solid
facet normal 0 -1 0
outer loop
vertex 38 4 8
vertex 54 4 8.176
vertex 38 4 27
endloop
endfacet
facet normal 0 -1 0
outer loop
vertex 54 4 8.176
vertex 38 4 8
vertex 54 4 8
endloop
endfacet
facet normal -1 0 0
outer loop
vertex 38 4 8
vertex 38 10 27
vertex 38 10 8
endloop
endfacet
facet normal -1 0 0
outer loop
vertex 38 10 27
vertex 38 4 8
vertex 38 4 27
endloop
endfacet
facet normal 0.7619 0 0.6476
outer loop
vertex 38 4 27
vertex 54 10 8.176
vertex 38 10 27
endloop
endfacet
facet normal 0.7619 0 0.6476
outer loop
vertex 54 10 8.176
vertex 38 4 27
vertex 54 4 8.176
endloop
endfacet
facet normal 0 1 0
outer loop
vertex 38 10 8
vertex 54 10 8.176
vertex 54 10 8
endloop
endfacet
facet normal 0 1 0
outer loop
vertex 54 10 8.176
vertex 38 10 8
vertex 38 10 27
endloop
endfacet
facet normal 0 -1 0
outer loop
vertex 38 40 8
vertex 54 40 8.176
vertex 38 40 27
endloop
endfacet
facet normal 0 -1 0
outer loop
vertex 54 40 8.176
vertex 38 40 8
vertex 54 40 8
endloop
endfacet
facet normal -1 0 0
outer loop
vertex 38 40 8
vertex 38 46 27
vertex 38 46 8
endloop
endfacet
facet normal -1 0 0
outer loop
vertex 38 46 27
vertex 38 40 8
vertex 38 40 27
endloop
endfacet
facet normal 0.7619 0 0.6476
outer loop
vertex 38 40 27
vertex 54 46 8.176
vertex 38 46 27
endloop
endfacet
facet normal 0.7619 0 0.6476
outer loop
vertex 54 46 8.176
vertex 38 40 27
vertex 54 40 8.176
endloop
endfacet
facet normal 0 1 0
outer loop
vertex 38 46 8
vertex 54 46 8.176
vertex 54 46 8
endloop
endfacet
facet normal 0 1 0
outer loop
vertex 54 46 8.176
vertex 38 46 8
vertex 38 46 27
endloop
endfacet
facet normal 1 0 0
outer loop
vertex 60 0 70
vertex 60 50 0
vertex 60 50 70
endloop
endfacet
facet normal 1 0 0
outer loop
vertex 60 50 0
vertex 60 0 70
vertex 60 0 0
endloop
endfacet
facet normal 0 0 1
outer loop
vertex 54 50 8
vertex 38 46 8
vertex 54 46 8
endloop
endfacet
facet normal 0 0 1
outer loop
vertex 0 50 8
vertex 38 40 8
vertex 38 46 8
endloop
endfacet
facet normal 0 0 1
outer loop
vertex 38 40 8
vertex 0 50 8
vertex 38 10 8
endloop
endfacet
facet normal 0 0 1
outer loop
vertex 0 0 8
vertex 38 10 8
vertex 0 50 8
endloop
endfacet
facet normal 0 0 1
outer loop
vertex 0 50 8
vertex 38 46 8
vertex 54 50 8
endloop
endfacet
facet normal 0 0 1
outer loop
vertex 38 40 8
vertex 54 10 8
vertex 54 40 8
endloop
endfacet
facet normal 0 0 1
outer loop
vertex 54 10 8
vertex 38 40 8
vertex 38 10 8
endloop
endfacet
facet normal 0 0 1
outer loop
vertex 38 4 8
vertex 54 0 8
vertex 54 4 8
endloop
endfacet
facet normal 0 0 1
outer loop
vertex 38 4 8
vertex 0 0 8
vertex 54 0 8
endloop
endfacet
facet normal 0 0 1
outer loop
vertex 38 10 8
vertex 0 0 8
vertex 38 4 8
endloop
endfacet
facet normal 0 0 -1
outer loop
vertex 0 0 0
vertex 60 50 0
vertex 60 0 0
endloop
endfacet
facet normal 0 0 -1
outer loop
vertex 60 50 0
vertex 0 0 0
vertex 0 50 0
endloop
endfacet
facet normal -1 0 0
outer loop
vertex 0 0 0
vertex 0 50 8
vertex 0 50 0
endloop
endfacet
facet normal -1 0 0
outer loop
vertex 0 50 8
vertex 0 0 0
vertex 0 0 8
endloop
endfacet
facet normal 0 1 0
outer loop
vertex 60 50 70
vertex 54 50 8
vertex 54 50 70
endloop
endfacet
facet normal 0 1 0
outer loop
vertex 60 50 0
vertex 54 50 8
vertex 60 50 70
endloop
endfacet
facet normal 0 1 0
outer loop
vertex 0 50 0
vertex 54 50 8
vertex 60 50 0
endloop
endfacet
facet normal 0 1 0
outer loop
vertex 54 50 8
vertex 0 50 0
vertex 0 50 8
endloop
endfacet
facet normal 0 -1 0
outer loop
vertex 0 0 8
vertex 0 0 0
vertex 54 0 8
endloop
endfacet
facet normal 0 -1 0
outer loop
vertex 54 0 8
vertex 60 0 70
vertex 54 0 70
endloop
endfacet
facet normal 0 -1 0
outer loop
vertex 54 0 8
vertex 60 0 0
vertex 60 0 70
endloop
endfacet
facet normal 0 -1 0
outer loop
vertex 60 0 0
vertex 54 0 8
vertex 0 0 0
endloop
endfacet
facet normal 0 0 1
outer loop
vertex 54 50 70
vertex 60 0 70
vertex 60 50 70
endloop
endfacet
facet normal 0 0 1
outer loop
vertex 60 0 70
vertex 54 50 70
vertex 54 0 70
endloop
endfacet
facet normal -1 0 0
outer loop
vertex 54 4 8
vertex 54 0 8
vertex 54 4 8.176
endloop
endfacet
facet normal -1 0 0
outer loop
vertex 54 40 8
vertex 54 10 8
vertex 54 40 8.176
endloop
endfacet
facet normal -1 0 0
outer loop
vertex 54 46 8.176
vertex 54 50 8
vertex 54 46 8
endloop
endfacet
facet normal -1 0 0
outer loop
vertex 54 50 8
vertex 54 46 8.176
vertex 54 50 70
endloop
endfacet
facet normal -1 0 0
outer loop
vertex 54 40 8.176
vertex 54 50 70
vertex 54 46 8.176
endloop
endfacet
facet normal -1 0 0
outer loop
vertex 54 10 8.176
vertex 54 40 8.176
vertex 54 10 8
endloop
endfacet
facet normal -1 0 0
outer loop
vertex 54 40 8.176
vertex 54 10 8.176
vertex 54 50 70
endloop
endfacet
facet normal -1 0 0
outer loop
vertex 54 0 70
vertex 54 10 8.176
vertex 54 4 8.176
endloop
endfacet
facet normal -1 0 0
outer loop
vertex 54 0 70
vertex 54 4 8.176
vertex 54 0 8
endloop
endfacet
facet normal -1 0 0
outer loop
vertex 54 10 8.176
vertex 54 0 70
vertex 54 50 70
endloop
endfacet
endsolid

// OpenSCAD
$fn = 32;

// ----------------------------------------------------------------------
// Rib bracket: 2-gusset L bracket
// ----------------------------------------------------------------------

// --- parameters (mm) ---
base_l = 60;              // foot length, X
base_w = 50;              // foot width, Y
base_t = 8;               // foot thickness
plate_t = 6;              // upright plate thickness
plate_h = 70;             // overall height
gus_l = 16;               // gusset leg along the foot
gus_h = 20;               // gusset height
gus_t = 6;                // gusset thickness
gus_edge = 4;             // gusset margin from the foot edge
n_gus = 2;                // gusset count

gus_pitch = (base_w - 2 * gus_edge - gus_t) / (n_gus - 1);  // gusset pitch

union() {
  cube([base_l, base_w, base_t]);
  translate([base_l - plate_t, 0, base_t - 1])
    cube([plate_t, base_w, plate_h - base_t + 1]);
  for (i = [0 : n_gus - 1])
    translate([base_l - plate_t - gus_l, gus_edge + i * gus_pitch, base_t - 1])
      rotate([-90, 0, 0])
        linear_extrude(height = gus_t)
          polygon(points = [[0, 0], [gus_l + 1, 0], [0, -gus_h]]);
}
